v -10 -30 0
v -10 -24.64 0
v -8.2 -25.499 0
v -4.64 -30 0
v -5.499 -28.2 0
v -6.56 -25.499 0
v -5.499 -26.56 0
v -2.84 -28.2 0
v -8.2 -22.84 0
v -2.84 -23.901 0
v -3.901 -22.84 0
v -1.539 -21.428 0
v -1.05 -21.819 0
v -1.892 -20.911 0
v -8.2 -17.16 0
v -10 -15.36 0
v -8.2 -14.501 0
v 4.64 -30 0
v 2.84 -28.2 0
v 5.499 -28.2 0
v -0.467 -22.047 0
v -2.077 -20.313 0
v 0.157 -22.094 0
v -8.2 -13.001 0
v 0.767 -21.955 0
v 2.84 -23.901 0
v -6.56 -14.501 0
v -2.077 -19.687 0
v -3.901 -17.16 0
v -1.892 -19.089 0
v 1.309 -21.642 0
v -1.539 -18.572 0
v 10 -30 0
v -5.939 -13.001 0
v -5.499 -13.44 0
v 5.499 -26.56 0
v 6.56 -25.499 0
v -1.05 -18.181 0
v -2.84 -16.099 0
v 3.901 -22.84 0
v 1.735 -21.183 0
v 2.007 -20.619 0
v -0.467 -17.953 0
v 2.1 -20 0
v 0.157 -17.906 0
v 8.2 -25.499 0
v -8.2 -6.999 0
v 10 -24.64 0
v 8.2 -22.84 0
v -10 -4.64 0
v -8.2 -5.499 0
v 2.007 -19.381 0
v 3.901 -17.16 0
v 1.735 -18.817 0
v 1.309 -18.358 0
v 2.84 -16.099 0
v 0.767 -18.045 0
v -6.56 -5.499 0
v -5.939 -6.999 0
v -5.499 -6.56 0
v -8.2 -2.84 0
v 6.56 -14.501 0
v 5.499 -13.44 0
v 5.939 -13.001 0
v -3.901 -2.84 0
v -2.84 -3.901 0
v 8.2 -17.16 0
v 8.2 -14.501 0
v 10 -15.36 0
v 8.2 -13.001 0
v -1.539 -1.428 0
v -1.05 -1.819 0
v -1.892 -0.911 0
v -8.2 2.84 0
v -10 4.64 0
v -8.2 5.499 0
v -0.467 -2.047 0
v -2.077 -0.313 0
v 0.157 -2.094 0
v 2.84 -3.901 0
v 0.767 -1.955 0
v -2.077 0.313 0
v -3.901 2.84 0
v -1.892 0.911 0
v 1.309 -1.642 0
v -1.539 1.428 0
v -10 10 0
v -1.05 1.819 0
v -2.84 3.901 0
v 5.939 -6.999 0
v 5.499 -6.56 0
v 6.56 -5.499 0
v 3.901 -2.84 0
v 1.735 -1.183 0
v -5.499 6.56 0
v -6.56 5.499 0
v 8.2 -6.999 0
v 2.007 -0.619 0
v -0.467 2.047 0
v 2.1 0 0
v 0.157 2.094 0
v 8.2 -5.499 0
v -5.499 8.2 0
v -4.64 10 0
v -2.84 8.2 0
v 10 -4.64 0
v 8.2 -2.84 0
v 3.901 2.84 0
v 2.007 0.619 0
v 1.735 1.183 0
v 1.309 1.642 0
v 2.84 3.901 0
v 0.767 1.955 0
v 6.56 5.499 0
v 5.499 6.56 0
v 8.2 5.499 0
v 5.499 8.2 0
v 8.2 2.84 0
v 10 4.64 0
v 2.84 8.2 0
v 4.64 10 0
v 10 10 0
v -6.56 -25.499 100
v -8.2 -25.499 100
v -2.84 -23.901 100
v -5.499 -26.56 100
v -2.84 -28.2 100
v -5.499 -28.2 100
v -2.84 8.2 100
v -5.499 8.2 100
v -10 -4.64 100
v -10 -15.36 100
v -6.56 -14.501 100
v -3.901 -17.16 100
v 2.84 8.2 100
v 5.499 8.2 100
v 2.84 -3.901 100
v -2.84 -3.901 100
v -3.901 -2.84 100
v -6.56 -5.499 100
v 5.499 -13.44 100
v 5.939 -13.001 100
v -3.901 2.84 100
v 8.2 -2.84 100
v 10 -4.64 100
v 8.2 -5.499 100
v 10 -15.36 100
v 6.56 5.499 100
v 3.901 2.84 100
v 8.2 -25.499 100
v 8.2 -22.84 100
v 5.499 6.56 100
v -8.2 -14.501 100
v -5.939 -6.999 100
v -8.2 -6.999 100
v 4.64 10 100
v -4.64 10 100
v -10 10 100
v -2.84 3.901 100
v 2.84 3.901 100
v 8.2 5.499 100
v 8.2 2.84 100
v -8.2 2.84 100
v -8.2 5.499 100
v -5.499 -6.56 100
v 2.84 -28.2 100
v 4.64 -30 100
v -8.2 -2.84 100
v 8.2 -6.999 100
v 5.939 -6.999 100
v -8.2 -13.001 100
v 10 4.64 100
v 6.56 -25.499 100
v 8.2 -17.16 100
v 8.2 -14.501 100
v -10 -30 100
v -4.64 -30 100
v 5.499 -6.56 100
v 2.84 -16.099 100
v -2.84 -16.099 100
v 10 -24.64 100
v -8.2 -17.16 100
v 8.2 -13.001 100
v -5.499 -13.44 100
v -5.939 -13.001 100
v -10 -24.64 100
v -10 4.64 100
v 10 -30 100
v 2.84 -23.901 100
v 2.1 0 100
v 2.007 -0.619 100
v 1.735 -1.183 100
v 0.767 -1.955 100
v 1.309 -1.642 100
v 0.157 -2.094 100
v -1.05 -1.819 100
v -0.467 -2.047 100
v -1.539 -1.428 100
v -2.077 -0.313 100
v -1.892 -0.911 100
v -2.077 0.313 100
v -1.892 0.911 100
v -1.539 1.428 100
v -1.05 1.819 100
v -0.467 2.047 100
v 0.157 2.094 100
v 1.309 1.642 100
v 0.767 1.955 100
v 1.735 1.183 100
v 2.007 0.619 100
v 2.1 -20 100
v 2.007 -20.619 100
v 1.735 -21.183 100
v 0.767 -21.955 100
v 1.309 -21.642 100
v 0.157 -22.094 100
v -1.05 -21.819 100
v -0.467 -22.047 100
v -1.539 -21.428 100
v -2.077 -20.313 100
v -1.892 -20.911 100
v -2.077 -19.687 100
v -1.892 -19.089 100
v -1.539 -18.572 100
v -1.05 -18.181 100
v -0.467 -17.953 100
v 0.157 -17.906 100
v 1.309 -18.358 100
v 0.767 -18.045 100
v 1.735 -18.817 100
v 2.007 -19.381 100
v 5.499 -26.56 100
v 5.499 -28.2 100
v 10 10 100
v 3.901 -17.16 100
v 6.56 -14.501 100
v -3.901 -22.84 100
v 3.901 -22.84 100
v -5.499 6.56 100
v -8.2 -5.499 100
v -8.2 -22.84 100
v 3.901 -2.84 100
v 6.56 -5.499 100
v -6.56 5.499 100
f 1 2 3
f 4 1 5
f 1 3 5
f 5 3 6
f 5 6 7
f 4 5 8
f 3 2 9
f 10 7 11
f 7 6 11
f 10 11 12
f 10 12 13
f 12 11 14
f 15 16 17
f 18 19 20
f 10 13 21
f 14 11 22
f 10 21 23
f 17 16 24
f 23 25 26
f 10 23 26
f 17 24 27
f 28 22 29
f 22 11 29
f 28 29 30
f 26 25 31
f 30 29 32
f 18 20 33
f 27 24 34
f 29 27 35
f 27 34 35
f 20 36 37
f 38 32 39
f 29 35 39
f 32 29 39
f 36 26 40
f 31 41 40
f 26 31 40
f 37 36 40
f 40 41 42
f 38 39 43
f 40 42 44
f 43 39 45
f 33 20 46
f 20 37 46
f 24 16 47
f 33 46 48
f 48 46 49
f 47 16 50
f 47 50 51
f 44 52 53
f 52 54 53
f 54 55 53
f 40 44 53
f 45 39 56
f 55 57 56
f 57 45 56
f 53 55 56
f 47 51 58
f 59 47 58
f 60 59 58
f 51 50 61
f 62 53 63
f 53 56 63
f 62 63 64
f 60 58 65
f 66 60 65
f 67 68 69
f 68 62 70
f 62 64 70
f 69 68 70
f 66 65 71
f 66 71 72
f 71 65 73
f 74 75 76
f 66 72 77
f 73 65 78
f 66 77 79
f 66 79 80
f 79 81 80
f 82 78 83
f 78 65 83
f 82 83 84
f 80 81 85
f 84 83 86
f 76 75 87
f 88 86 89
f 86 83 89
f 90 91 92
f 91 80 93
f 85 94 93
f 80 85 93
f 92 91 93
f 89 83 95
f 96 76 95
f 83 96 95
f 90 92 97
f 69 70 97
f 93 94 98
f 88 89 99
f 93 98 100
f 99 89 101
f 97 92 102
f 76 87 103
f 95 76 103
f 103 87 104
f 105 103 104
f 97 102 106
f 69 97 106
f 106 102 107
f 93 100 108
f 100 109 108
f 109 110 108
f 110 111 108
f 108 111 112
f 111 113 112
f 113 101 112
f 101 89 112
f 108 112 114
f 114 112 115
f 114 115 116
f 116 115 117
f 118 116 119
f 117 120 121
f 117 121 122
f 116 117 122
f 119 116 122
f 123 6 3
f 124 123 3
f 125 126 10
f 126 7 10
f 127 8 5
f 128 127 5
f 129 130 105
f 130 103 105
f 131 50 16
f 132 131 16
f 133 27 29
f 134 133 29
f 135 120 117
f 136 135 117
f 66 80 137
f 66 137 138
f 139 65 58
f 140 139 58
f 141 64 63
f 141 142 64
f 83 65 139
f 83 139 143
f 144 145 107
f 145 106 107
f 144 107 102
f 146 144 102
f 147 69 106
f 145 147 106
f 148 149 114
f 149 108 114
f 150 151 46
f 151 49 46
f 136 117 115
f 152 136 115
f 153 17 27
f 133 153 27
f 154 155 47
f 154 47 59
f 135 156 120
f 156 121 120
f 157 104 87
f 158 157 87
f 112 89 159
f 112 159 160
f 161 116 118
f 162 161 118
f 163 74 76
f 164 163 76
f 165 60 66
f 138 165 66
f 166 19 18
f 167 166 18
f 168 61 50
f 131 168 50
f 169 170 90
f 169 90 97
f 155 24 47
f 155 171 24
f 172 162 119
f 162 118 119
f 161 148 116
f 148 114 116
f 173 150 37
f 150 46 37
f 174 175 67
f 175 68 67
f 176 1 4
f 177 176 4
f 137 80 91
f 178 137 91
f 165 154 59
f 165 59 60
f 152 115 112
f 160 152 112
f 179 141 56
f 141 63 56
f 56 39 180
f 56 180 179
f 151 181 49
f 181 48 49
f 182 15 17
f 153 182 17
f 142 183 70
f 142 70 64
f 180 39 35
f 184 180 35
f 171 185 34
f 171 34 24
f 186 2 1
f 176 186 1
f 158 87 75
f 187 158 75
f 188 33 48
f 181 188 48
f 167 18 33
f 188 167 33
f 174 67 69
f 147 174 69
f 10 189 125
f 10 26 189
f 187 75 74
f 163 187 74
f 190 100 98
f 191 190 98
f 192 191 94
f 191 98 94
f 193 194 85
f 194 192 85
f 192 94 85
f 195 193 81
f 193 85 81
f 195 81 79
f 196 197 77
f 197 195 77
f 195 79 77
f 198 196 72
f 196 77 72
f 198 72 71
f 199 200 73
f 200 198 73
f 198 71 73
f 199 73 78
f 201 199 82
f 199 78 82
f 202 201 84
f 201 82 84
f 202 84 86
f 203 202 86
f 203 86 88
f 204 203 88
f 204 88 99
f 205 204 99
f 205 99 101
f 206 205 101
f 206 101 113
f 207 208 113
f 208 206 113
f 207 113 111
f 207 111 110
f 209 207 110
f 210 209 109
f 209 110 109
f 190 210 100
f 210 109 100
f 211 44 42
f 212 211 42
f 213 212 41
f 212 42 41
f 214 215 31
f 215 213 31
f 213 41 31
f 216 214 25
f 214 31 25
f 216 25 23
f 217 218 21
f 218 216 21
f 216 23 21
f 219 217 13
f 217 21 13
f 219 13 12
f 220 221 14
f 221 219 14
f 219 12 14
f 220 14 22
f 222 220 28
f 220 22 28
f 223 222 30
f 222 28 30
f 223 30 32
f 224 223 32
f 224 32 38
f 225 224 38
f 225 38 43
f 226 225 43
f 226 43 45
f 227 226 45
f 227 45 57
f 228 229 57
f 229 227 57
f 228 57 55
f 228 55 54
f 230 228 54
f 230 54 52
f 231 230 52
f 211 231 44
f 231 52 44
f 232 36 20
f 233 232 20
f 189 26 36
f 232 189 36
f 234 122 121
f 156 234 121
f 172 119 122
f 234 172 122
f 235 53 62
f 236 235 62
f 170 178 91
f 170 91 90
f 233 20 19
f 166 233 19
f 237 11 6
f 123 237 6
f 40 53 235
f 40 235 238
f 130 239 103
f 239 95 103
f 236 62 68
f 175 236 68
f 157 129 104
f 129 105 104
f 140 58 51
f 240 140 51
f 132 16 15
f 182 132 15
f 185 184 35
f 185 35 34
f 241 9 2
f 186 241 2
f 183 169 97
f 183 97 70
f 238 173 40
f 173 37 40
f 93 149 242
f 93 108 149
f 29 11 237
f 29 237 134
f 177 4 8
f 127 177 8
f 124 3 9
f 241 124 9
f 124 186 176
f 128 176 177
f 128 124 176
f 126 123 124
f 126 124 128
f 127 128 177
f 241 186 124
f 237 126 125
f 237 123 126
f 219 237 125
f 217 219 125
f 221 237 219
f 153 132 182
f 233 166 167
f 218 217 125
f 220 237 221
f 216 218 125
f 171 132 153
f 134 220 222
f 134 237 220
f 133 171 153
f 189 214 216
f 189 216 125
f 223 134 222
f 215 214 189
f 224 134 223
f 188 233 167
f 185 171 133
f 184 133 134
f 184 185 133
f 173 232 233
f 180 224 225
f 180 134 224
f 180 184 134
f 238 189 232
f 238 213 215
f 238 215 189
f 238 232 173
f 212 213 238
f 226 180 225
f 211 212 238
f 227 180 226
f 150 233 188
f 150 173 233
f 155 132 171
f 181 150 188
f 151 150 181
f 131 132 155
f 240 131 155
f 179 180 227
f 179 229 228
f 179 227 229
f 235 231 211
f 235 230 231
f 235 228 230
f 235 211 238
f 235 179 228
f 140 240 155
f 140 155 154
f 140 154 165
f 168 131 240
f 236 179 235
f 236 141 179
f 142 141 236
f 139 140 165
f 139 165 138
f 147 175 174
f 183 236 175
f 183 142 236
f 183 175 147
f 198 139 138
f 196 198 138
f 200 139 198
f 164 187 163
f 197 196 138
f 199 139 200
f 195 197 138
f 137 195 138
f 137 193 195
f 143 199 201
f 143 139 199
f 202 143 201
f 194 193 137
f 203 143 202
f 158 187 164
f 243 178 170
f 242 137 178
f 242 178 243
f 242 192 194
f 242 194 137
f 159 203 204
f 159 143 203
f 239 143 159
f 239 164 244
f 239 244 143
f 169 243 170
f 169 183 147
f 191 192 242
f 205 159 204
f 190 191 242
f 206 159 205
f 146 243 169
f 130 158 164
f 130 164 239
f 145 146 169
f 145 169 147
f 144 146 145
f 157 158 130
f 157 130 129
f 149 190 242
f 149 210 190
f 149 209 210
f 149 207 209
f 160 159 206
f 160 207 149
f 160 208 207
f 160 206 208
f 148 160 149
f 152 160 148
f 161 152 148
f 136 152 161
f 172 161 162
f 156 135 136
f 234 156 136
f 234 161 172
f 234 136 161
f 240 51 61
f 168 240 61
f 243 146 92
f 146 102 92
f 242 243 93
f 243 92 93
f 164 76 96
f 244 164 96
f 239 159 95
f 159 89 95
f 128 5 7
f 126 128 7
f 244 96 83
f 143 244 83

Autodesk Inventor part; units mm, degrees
ref_plane "YZ Plane" through (0, 0, 0) normal (1, 0, 0) x (0, 1, 0)
ref_plane "XY Plane" through (0, 0, 0) normal (0, 0, 1) x (1, 0, 0)
sketch "Sketch1" plane through (0, 0, 0) normal (0, 0, 1) x (1, 0, 0)
  line L0 (-3.9007, 3.9007) -> (3.9007, 3.9007)
  line L1 (3.9007, 3.9007) -> (3.9007, -3.9007)
  line L2 (3.9007, -3.9007) -> (-3.9007, -3.9007)
  line L3 (-3.9007, -3.9007) -> (-3.9007, 3.9007)
  line L4 (0, 3.9007) -> (0, -3.9007) construction
  line L5 (-3.9007, 0) -> (3.9007, 0) construction
  circle A0 centre (0, 0) radius 2.1
  line L6 (0, 0) -> (-16.1173, 16.1173) construction
  line L7 (0, 0) -> (22.7933, 0) construction
  line L8 (-2.84, 3.9007) -> (-5.4993, 6.56)
  line L9 (-5.4993, 6.56) -> (-5.4993, 8.2)
  line L10 (-5.4993, 8.2) -> (-2.84, 8.2)
  line L11 (-2.84, 8.2) -> (-4.64, 10)
  line L12 (-4.64, 10) -> (-10, 10)
  line L13 (-10, 10) -> (-10, 4.64)
  line L14 (-10, 4.64) -> (-8.2, 2.84)
  line L15 (-8.2, 2.84) -> (-8.2, 5.4993)
  line L16 (-8.2, 5.4993) -> (-6.56, 5.4993)
  line L17 (-6.56, 5.4993) -> (-3.9007, 2.84)
  line L18 (-3.9007, 2.84) -> (-11.3102, 2.84) construction
  line L19 (-2.84, 3.9007) -> (-3.9007, 3.9007)
  line L20 (-3.9007, 2.84) -> (-3.9007, 3.9007)
  line L21 (-3.9007, -2.84) -> (-6.56, -5.4993)
  line L22 (-6.56, -5.4993) -> (-8.2, -5.4993)
  line L23 (-8.2, -5.4993) -> (-8.2, -2.84)
  line L24 (-8.2, -2.84) -> (-10, -4.64)
  line L25 (-10, -4.64) -> (-10, -10)
  line L26 (-10, -10) -> (-4.64, -10)
  line L27 (-4.64, -10) -> (-2.84, -8.2)
  line L28 (-2.84, -8.2) -> (-5.4993, -8.2)
  line L29 (-5.4993, -8.2) -> (-5.4993, -6.56)
  line L30 (-5.4993, -6.56) -> (-2.84, -3.9007)
  line L31 (-3.9007, -2.84) -> (-3.9007, -3.9007)
  line L32 (-2.84, -3.9007) -> (-3.9007, -3.9007)
  line L33 (2.84, -3.9007) -> (5.4993, -6.56)
  line L34 (5.4993, -6.56) -> (5.4993, -8.2)
  line L35 (5.4993, -8.2) -> (2.84, -8.2)
  line L36 (2.84, -8.2) -> (4.64, -10)
  line L37 (4.64, -10) -> (10, -10)
  line L38 (10, -10) -> (10, -4.64)
  line L39 (10, -4.64) -> (8.2, -2.84)
  line L40 (8.2, -2.84) -> (8.2, -5.4993)
  line L41 (8.2, -5.4993) -> (6.56, -5.4993)
  line L42 (6.56, -5.4993) -> (3.9007, -2.84)
  line L43 (2.84, -3.9007) -> (3.9007, -3.9007)
  line L44 (3.9007, -2.84) -> (3.9007, -3.9007)
  line L45 (3.9007, 2.84) -> (6.56, 5.4993)
  line L46 (6.56, 5.4993) -> (8.2, 5.4993)
  line L47 (8.2, 5.4993) -> (8.2, 2.84)
  line L48 (8.2, 2.84) -> (10, 4.64)
  line L49 (10, 4.64) -> (10, 10)
  line L50 (10, 10) -> (4.64, 10)
  line L51 (4.64, 10) -> (2.84, 8.2)
  line L52 (2.84, 8.2) -> (5.4993, 8.2)
  line L53 (5.4993, 8.2) -> (5.4993, 6.56)
  line L54 (5.4993, 6.56) -> (2.84, 3.9007)
  line L55 (3.9007, 2.84) -> (3.9007, 3.9007)
  line L56 (2.84, 3.9007) -> (3.9007, 3.9007)
  dimension "d7" = 4.2
  dimension "d8" = 135
  dimension "d9" = 1.5
  dimension "d10" = 1.64
  dimension "d11" = 1.8
  dimension "d12" = 2.84
  dimension "d13" = 10
  dimension "d16" = 360
extrude "Extrusion1" add sketch "Sketch1" along normal blind 100
pattern_linear "Rectangular Pattern1" count 2 spacing 20 along (0, -1, 0) of "Extrusion1"
sketch "Sketch2" plane through (0, 0, 100) normal (0, 0, 1) x (1, 0, 0)
  line L0 (8.2, -2.84) -> (8.2, -5.4993) projected
  line L1 (8.2, -5.4993) -> (6.56, -5.4993) projected
  line L2 (-6.56, -5.4993) -> (-8.2, -5.4993) projected
  line L3 (-8.2, -5.4993) -> (-8.2, -2.84) projected
  line L4 (-8.2, -14.5007) -> (-6.56, -14.5007) projected
  line L5 (6.56, -14.5007) -> (8.2, -14.5007) projected
  line L6 (5.4993, -11.8) -> (5.4993, -13.44) projected
  line L7 (5.4993, -13.44) -> (2.84, -16.0993) projected
  line L8 (-2.84, -16.0993) -> (-5.4993, -13.44) projected
  line L9 (-5.4993, -8.2) -> (-5.4993, -6.56) projected
  line L10 (-5.4993, -6.56) -> (-2.84, -3.9007) projected
  line L11 (2.84, -3.9007) -> (5.4993, -6.56) projected
  line L12 (2.84, -8.2) -> (4.64, -10) projected
  line L13 (-8.2, -6.9993) -> (-5.9387, -6.9993)
  line L14 (-5.9387, -6.9993) -> (-4.1231, -5.1837)
  line L15 (-4.1231, -5.1837) -> (4.1231, -5.1837)
  line L16 (4.1231, -5.1837) -> (5.9387, -6.9993)
  line L17 (5.9387, -6.9993) -> (8.2, -6.9993)
  line L18 (8.2, -6.9993) -> (8.2, -13.0007)
  line L19 (8.2, -13.0007) -> (5.9387, -13.0007)
  line L20 (5.9387, -13.0007) -> (4.2461, -14.6932)
  line L21 (4.2461, -14.6932) -> (-4.2461, -14.6932)
  line L22 (-4.2461, -14.6932) -> (-5.9387, -13.0007)
  line L23 (-5.9387, -13.0007) -> (-8.2, -13.0007)
  line L24 (-8.2, -13.0007) -> (-8.2, -6.9993)
  dimension "d23" = 1.5
  dimension "d24" = 1.5
  dimension "d25" = 1.5
  dimension "d26" = 1.5
extrude "Extrusion2" cut sketch "Sketch2" against normal up to next
ref_plane "Work Plane3" through (0, -20, 0) normal (0, 1, 0) x (-1, 0, 0)
ref_plane "Work Plane2" through (0, 0, 0) normal (0, 1, 0) x (-1, 0, 0)
ref_plane "Work Plane1" through (0, -10, 0) normal (0, 1, 0) x (-1, 0, 0)
equation "\"d24\" = d23"
equation "\"d25\" = d23"
equation "\"d26\" = d23"
properties part number "20x40x597mm" material "Aluminum 6061"
